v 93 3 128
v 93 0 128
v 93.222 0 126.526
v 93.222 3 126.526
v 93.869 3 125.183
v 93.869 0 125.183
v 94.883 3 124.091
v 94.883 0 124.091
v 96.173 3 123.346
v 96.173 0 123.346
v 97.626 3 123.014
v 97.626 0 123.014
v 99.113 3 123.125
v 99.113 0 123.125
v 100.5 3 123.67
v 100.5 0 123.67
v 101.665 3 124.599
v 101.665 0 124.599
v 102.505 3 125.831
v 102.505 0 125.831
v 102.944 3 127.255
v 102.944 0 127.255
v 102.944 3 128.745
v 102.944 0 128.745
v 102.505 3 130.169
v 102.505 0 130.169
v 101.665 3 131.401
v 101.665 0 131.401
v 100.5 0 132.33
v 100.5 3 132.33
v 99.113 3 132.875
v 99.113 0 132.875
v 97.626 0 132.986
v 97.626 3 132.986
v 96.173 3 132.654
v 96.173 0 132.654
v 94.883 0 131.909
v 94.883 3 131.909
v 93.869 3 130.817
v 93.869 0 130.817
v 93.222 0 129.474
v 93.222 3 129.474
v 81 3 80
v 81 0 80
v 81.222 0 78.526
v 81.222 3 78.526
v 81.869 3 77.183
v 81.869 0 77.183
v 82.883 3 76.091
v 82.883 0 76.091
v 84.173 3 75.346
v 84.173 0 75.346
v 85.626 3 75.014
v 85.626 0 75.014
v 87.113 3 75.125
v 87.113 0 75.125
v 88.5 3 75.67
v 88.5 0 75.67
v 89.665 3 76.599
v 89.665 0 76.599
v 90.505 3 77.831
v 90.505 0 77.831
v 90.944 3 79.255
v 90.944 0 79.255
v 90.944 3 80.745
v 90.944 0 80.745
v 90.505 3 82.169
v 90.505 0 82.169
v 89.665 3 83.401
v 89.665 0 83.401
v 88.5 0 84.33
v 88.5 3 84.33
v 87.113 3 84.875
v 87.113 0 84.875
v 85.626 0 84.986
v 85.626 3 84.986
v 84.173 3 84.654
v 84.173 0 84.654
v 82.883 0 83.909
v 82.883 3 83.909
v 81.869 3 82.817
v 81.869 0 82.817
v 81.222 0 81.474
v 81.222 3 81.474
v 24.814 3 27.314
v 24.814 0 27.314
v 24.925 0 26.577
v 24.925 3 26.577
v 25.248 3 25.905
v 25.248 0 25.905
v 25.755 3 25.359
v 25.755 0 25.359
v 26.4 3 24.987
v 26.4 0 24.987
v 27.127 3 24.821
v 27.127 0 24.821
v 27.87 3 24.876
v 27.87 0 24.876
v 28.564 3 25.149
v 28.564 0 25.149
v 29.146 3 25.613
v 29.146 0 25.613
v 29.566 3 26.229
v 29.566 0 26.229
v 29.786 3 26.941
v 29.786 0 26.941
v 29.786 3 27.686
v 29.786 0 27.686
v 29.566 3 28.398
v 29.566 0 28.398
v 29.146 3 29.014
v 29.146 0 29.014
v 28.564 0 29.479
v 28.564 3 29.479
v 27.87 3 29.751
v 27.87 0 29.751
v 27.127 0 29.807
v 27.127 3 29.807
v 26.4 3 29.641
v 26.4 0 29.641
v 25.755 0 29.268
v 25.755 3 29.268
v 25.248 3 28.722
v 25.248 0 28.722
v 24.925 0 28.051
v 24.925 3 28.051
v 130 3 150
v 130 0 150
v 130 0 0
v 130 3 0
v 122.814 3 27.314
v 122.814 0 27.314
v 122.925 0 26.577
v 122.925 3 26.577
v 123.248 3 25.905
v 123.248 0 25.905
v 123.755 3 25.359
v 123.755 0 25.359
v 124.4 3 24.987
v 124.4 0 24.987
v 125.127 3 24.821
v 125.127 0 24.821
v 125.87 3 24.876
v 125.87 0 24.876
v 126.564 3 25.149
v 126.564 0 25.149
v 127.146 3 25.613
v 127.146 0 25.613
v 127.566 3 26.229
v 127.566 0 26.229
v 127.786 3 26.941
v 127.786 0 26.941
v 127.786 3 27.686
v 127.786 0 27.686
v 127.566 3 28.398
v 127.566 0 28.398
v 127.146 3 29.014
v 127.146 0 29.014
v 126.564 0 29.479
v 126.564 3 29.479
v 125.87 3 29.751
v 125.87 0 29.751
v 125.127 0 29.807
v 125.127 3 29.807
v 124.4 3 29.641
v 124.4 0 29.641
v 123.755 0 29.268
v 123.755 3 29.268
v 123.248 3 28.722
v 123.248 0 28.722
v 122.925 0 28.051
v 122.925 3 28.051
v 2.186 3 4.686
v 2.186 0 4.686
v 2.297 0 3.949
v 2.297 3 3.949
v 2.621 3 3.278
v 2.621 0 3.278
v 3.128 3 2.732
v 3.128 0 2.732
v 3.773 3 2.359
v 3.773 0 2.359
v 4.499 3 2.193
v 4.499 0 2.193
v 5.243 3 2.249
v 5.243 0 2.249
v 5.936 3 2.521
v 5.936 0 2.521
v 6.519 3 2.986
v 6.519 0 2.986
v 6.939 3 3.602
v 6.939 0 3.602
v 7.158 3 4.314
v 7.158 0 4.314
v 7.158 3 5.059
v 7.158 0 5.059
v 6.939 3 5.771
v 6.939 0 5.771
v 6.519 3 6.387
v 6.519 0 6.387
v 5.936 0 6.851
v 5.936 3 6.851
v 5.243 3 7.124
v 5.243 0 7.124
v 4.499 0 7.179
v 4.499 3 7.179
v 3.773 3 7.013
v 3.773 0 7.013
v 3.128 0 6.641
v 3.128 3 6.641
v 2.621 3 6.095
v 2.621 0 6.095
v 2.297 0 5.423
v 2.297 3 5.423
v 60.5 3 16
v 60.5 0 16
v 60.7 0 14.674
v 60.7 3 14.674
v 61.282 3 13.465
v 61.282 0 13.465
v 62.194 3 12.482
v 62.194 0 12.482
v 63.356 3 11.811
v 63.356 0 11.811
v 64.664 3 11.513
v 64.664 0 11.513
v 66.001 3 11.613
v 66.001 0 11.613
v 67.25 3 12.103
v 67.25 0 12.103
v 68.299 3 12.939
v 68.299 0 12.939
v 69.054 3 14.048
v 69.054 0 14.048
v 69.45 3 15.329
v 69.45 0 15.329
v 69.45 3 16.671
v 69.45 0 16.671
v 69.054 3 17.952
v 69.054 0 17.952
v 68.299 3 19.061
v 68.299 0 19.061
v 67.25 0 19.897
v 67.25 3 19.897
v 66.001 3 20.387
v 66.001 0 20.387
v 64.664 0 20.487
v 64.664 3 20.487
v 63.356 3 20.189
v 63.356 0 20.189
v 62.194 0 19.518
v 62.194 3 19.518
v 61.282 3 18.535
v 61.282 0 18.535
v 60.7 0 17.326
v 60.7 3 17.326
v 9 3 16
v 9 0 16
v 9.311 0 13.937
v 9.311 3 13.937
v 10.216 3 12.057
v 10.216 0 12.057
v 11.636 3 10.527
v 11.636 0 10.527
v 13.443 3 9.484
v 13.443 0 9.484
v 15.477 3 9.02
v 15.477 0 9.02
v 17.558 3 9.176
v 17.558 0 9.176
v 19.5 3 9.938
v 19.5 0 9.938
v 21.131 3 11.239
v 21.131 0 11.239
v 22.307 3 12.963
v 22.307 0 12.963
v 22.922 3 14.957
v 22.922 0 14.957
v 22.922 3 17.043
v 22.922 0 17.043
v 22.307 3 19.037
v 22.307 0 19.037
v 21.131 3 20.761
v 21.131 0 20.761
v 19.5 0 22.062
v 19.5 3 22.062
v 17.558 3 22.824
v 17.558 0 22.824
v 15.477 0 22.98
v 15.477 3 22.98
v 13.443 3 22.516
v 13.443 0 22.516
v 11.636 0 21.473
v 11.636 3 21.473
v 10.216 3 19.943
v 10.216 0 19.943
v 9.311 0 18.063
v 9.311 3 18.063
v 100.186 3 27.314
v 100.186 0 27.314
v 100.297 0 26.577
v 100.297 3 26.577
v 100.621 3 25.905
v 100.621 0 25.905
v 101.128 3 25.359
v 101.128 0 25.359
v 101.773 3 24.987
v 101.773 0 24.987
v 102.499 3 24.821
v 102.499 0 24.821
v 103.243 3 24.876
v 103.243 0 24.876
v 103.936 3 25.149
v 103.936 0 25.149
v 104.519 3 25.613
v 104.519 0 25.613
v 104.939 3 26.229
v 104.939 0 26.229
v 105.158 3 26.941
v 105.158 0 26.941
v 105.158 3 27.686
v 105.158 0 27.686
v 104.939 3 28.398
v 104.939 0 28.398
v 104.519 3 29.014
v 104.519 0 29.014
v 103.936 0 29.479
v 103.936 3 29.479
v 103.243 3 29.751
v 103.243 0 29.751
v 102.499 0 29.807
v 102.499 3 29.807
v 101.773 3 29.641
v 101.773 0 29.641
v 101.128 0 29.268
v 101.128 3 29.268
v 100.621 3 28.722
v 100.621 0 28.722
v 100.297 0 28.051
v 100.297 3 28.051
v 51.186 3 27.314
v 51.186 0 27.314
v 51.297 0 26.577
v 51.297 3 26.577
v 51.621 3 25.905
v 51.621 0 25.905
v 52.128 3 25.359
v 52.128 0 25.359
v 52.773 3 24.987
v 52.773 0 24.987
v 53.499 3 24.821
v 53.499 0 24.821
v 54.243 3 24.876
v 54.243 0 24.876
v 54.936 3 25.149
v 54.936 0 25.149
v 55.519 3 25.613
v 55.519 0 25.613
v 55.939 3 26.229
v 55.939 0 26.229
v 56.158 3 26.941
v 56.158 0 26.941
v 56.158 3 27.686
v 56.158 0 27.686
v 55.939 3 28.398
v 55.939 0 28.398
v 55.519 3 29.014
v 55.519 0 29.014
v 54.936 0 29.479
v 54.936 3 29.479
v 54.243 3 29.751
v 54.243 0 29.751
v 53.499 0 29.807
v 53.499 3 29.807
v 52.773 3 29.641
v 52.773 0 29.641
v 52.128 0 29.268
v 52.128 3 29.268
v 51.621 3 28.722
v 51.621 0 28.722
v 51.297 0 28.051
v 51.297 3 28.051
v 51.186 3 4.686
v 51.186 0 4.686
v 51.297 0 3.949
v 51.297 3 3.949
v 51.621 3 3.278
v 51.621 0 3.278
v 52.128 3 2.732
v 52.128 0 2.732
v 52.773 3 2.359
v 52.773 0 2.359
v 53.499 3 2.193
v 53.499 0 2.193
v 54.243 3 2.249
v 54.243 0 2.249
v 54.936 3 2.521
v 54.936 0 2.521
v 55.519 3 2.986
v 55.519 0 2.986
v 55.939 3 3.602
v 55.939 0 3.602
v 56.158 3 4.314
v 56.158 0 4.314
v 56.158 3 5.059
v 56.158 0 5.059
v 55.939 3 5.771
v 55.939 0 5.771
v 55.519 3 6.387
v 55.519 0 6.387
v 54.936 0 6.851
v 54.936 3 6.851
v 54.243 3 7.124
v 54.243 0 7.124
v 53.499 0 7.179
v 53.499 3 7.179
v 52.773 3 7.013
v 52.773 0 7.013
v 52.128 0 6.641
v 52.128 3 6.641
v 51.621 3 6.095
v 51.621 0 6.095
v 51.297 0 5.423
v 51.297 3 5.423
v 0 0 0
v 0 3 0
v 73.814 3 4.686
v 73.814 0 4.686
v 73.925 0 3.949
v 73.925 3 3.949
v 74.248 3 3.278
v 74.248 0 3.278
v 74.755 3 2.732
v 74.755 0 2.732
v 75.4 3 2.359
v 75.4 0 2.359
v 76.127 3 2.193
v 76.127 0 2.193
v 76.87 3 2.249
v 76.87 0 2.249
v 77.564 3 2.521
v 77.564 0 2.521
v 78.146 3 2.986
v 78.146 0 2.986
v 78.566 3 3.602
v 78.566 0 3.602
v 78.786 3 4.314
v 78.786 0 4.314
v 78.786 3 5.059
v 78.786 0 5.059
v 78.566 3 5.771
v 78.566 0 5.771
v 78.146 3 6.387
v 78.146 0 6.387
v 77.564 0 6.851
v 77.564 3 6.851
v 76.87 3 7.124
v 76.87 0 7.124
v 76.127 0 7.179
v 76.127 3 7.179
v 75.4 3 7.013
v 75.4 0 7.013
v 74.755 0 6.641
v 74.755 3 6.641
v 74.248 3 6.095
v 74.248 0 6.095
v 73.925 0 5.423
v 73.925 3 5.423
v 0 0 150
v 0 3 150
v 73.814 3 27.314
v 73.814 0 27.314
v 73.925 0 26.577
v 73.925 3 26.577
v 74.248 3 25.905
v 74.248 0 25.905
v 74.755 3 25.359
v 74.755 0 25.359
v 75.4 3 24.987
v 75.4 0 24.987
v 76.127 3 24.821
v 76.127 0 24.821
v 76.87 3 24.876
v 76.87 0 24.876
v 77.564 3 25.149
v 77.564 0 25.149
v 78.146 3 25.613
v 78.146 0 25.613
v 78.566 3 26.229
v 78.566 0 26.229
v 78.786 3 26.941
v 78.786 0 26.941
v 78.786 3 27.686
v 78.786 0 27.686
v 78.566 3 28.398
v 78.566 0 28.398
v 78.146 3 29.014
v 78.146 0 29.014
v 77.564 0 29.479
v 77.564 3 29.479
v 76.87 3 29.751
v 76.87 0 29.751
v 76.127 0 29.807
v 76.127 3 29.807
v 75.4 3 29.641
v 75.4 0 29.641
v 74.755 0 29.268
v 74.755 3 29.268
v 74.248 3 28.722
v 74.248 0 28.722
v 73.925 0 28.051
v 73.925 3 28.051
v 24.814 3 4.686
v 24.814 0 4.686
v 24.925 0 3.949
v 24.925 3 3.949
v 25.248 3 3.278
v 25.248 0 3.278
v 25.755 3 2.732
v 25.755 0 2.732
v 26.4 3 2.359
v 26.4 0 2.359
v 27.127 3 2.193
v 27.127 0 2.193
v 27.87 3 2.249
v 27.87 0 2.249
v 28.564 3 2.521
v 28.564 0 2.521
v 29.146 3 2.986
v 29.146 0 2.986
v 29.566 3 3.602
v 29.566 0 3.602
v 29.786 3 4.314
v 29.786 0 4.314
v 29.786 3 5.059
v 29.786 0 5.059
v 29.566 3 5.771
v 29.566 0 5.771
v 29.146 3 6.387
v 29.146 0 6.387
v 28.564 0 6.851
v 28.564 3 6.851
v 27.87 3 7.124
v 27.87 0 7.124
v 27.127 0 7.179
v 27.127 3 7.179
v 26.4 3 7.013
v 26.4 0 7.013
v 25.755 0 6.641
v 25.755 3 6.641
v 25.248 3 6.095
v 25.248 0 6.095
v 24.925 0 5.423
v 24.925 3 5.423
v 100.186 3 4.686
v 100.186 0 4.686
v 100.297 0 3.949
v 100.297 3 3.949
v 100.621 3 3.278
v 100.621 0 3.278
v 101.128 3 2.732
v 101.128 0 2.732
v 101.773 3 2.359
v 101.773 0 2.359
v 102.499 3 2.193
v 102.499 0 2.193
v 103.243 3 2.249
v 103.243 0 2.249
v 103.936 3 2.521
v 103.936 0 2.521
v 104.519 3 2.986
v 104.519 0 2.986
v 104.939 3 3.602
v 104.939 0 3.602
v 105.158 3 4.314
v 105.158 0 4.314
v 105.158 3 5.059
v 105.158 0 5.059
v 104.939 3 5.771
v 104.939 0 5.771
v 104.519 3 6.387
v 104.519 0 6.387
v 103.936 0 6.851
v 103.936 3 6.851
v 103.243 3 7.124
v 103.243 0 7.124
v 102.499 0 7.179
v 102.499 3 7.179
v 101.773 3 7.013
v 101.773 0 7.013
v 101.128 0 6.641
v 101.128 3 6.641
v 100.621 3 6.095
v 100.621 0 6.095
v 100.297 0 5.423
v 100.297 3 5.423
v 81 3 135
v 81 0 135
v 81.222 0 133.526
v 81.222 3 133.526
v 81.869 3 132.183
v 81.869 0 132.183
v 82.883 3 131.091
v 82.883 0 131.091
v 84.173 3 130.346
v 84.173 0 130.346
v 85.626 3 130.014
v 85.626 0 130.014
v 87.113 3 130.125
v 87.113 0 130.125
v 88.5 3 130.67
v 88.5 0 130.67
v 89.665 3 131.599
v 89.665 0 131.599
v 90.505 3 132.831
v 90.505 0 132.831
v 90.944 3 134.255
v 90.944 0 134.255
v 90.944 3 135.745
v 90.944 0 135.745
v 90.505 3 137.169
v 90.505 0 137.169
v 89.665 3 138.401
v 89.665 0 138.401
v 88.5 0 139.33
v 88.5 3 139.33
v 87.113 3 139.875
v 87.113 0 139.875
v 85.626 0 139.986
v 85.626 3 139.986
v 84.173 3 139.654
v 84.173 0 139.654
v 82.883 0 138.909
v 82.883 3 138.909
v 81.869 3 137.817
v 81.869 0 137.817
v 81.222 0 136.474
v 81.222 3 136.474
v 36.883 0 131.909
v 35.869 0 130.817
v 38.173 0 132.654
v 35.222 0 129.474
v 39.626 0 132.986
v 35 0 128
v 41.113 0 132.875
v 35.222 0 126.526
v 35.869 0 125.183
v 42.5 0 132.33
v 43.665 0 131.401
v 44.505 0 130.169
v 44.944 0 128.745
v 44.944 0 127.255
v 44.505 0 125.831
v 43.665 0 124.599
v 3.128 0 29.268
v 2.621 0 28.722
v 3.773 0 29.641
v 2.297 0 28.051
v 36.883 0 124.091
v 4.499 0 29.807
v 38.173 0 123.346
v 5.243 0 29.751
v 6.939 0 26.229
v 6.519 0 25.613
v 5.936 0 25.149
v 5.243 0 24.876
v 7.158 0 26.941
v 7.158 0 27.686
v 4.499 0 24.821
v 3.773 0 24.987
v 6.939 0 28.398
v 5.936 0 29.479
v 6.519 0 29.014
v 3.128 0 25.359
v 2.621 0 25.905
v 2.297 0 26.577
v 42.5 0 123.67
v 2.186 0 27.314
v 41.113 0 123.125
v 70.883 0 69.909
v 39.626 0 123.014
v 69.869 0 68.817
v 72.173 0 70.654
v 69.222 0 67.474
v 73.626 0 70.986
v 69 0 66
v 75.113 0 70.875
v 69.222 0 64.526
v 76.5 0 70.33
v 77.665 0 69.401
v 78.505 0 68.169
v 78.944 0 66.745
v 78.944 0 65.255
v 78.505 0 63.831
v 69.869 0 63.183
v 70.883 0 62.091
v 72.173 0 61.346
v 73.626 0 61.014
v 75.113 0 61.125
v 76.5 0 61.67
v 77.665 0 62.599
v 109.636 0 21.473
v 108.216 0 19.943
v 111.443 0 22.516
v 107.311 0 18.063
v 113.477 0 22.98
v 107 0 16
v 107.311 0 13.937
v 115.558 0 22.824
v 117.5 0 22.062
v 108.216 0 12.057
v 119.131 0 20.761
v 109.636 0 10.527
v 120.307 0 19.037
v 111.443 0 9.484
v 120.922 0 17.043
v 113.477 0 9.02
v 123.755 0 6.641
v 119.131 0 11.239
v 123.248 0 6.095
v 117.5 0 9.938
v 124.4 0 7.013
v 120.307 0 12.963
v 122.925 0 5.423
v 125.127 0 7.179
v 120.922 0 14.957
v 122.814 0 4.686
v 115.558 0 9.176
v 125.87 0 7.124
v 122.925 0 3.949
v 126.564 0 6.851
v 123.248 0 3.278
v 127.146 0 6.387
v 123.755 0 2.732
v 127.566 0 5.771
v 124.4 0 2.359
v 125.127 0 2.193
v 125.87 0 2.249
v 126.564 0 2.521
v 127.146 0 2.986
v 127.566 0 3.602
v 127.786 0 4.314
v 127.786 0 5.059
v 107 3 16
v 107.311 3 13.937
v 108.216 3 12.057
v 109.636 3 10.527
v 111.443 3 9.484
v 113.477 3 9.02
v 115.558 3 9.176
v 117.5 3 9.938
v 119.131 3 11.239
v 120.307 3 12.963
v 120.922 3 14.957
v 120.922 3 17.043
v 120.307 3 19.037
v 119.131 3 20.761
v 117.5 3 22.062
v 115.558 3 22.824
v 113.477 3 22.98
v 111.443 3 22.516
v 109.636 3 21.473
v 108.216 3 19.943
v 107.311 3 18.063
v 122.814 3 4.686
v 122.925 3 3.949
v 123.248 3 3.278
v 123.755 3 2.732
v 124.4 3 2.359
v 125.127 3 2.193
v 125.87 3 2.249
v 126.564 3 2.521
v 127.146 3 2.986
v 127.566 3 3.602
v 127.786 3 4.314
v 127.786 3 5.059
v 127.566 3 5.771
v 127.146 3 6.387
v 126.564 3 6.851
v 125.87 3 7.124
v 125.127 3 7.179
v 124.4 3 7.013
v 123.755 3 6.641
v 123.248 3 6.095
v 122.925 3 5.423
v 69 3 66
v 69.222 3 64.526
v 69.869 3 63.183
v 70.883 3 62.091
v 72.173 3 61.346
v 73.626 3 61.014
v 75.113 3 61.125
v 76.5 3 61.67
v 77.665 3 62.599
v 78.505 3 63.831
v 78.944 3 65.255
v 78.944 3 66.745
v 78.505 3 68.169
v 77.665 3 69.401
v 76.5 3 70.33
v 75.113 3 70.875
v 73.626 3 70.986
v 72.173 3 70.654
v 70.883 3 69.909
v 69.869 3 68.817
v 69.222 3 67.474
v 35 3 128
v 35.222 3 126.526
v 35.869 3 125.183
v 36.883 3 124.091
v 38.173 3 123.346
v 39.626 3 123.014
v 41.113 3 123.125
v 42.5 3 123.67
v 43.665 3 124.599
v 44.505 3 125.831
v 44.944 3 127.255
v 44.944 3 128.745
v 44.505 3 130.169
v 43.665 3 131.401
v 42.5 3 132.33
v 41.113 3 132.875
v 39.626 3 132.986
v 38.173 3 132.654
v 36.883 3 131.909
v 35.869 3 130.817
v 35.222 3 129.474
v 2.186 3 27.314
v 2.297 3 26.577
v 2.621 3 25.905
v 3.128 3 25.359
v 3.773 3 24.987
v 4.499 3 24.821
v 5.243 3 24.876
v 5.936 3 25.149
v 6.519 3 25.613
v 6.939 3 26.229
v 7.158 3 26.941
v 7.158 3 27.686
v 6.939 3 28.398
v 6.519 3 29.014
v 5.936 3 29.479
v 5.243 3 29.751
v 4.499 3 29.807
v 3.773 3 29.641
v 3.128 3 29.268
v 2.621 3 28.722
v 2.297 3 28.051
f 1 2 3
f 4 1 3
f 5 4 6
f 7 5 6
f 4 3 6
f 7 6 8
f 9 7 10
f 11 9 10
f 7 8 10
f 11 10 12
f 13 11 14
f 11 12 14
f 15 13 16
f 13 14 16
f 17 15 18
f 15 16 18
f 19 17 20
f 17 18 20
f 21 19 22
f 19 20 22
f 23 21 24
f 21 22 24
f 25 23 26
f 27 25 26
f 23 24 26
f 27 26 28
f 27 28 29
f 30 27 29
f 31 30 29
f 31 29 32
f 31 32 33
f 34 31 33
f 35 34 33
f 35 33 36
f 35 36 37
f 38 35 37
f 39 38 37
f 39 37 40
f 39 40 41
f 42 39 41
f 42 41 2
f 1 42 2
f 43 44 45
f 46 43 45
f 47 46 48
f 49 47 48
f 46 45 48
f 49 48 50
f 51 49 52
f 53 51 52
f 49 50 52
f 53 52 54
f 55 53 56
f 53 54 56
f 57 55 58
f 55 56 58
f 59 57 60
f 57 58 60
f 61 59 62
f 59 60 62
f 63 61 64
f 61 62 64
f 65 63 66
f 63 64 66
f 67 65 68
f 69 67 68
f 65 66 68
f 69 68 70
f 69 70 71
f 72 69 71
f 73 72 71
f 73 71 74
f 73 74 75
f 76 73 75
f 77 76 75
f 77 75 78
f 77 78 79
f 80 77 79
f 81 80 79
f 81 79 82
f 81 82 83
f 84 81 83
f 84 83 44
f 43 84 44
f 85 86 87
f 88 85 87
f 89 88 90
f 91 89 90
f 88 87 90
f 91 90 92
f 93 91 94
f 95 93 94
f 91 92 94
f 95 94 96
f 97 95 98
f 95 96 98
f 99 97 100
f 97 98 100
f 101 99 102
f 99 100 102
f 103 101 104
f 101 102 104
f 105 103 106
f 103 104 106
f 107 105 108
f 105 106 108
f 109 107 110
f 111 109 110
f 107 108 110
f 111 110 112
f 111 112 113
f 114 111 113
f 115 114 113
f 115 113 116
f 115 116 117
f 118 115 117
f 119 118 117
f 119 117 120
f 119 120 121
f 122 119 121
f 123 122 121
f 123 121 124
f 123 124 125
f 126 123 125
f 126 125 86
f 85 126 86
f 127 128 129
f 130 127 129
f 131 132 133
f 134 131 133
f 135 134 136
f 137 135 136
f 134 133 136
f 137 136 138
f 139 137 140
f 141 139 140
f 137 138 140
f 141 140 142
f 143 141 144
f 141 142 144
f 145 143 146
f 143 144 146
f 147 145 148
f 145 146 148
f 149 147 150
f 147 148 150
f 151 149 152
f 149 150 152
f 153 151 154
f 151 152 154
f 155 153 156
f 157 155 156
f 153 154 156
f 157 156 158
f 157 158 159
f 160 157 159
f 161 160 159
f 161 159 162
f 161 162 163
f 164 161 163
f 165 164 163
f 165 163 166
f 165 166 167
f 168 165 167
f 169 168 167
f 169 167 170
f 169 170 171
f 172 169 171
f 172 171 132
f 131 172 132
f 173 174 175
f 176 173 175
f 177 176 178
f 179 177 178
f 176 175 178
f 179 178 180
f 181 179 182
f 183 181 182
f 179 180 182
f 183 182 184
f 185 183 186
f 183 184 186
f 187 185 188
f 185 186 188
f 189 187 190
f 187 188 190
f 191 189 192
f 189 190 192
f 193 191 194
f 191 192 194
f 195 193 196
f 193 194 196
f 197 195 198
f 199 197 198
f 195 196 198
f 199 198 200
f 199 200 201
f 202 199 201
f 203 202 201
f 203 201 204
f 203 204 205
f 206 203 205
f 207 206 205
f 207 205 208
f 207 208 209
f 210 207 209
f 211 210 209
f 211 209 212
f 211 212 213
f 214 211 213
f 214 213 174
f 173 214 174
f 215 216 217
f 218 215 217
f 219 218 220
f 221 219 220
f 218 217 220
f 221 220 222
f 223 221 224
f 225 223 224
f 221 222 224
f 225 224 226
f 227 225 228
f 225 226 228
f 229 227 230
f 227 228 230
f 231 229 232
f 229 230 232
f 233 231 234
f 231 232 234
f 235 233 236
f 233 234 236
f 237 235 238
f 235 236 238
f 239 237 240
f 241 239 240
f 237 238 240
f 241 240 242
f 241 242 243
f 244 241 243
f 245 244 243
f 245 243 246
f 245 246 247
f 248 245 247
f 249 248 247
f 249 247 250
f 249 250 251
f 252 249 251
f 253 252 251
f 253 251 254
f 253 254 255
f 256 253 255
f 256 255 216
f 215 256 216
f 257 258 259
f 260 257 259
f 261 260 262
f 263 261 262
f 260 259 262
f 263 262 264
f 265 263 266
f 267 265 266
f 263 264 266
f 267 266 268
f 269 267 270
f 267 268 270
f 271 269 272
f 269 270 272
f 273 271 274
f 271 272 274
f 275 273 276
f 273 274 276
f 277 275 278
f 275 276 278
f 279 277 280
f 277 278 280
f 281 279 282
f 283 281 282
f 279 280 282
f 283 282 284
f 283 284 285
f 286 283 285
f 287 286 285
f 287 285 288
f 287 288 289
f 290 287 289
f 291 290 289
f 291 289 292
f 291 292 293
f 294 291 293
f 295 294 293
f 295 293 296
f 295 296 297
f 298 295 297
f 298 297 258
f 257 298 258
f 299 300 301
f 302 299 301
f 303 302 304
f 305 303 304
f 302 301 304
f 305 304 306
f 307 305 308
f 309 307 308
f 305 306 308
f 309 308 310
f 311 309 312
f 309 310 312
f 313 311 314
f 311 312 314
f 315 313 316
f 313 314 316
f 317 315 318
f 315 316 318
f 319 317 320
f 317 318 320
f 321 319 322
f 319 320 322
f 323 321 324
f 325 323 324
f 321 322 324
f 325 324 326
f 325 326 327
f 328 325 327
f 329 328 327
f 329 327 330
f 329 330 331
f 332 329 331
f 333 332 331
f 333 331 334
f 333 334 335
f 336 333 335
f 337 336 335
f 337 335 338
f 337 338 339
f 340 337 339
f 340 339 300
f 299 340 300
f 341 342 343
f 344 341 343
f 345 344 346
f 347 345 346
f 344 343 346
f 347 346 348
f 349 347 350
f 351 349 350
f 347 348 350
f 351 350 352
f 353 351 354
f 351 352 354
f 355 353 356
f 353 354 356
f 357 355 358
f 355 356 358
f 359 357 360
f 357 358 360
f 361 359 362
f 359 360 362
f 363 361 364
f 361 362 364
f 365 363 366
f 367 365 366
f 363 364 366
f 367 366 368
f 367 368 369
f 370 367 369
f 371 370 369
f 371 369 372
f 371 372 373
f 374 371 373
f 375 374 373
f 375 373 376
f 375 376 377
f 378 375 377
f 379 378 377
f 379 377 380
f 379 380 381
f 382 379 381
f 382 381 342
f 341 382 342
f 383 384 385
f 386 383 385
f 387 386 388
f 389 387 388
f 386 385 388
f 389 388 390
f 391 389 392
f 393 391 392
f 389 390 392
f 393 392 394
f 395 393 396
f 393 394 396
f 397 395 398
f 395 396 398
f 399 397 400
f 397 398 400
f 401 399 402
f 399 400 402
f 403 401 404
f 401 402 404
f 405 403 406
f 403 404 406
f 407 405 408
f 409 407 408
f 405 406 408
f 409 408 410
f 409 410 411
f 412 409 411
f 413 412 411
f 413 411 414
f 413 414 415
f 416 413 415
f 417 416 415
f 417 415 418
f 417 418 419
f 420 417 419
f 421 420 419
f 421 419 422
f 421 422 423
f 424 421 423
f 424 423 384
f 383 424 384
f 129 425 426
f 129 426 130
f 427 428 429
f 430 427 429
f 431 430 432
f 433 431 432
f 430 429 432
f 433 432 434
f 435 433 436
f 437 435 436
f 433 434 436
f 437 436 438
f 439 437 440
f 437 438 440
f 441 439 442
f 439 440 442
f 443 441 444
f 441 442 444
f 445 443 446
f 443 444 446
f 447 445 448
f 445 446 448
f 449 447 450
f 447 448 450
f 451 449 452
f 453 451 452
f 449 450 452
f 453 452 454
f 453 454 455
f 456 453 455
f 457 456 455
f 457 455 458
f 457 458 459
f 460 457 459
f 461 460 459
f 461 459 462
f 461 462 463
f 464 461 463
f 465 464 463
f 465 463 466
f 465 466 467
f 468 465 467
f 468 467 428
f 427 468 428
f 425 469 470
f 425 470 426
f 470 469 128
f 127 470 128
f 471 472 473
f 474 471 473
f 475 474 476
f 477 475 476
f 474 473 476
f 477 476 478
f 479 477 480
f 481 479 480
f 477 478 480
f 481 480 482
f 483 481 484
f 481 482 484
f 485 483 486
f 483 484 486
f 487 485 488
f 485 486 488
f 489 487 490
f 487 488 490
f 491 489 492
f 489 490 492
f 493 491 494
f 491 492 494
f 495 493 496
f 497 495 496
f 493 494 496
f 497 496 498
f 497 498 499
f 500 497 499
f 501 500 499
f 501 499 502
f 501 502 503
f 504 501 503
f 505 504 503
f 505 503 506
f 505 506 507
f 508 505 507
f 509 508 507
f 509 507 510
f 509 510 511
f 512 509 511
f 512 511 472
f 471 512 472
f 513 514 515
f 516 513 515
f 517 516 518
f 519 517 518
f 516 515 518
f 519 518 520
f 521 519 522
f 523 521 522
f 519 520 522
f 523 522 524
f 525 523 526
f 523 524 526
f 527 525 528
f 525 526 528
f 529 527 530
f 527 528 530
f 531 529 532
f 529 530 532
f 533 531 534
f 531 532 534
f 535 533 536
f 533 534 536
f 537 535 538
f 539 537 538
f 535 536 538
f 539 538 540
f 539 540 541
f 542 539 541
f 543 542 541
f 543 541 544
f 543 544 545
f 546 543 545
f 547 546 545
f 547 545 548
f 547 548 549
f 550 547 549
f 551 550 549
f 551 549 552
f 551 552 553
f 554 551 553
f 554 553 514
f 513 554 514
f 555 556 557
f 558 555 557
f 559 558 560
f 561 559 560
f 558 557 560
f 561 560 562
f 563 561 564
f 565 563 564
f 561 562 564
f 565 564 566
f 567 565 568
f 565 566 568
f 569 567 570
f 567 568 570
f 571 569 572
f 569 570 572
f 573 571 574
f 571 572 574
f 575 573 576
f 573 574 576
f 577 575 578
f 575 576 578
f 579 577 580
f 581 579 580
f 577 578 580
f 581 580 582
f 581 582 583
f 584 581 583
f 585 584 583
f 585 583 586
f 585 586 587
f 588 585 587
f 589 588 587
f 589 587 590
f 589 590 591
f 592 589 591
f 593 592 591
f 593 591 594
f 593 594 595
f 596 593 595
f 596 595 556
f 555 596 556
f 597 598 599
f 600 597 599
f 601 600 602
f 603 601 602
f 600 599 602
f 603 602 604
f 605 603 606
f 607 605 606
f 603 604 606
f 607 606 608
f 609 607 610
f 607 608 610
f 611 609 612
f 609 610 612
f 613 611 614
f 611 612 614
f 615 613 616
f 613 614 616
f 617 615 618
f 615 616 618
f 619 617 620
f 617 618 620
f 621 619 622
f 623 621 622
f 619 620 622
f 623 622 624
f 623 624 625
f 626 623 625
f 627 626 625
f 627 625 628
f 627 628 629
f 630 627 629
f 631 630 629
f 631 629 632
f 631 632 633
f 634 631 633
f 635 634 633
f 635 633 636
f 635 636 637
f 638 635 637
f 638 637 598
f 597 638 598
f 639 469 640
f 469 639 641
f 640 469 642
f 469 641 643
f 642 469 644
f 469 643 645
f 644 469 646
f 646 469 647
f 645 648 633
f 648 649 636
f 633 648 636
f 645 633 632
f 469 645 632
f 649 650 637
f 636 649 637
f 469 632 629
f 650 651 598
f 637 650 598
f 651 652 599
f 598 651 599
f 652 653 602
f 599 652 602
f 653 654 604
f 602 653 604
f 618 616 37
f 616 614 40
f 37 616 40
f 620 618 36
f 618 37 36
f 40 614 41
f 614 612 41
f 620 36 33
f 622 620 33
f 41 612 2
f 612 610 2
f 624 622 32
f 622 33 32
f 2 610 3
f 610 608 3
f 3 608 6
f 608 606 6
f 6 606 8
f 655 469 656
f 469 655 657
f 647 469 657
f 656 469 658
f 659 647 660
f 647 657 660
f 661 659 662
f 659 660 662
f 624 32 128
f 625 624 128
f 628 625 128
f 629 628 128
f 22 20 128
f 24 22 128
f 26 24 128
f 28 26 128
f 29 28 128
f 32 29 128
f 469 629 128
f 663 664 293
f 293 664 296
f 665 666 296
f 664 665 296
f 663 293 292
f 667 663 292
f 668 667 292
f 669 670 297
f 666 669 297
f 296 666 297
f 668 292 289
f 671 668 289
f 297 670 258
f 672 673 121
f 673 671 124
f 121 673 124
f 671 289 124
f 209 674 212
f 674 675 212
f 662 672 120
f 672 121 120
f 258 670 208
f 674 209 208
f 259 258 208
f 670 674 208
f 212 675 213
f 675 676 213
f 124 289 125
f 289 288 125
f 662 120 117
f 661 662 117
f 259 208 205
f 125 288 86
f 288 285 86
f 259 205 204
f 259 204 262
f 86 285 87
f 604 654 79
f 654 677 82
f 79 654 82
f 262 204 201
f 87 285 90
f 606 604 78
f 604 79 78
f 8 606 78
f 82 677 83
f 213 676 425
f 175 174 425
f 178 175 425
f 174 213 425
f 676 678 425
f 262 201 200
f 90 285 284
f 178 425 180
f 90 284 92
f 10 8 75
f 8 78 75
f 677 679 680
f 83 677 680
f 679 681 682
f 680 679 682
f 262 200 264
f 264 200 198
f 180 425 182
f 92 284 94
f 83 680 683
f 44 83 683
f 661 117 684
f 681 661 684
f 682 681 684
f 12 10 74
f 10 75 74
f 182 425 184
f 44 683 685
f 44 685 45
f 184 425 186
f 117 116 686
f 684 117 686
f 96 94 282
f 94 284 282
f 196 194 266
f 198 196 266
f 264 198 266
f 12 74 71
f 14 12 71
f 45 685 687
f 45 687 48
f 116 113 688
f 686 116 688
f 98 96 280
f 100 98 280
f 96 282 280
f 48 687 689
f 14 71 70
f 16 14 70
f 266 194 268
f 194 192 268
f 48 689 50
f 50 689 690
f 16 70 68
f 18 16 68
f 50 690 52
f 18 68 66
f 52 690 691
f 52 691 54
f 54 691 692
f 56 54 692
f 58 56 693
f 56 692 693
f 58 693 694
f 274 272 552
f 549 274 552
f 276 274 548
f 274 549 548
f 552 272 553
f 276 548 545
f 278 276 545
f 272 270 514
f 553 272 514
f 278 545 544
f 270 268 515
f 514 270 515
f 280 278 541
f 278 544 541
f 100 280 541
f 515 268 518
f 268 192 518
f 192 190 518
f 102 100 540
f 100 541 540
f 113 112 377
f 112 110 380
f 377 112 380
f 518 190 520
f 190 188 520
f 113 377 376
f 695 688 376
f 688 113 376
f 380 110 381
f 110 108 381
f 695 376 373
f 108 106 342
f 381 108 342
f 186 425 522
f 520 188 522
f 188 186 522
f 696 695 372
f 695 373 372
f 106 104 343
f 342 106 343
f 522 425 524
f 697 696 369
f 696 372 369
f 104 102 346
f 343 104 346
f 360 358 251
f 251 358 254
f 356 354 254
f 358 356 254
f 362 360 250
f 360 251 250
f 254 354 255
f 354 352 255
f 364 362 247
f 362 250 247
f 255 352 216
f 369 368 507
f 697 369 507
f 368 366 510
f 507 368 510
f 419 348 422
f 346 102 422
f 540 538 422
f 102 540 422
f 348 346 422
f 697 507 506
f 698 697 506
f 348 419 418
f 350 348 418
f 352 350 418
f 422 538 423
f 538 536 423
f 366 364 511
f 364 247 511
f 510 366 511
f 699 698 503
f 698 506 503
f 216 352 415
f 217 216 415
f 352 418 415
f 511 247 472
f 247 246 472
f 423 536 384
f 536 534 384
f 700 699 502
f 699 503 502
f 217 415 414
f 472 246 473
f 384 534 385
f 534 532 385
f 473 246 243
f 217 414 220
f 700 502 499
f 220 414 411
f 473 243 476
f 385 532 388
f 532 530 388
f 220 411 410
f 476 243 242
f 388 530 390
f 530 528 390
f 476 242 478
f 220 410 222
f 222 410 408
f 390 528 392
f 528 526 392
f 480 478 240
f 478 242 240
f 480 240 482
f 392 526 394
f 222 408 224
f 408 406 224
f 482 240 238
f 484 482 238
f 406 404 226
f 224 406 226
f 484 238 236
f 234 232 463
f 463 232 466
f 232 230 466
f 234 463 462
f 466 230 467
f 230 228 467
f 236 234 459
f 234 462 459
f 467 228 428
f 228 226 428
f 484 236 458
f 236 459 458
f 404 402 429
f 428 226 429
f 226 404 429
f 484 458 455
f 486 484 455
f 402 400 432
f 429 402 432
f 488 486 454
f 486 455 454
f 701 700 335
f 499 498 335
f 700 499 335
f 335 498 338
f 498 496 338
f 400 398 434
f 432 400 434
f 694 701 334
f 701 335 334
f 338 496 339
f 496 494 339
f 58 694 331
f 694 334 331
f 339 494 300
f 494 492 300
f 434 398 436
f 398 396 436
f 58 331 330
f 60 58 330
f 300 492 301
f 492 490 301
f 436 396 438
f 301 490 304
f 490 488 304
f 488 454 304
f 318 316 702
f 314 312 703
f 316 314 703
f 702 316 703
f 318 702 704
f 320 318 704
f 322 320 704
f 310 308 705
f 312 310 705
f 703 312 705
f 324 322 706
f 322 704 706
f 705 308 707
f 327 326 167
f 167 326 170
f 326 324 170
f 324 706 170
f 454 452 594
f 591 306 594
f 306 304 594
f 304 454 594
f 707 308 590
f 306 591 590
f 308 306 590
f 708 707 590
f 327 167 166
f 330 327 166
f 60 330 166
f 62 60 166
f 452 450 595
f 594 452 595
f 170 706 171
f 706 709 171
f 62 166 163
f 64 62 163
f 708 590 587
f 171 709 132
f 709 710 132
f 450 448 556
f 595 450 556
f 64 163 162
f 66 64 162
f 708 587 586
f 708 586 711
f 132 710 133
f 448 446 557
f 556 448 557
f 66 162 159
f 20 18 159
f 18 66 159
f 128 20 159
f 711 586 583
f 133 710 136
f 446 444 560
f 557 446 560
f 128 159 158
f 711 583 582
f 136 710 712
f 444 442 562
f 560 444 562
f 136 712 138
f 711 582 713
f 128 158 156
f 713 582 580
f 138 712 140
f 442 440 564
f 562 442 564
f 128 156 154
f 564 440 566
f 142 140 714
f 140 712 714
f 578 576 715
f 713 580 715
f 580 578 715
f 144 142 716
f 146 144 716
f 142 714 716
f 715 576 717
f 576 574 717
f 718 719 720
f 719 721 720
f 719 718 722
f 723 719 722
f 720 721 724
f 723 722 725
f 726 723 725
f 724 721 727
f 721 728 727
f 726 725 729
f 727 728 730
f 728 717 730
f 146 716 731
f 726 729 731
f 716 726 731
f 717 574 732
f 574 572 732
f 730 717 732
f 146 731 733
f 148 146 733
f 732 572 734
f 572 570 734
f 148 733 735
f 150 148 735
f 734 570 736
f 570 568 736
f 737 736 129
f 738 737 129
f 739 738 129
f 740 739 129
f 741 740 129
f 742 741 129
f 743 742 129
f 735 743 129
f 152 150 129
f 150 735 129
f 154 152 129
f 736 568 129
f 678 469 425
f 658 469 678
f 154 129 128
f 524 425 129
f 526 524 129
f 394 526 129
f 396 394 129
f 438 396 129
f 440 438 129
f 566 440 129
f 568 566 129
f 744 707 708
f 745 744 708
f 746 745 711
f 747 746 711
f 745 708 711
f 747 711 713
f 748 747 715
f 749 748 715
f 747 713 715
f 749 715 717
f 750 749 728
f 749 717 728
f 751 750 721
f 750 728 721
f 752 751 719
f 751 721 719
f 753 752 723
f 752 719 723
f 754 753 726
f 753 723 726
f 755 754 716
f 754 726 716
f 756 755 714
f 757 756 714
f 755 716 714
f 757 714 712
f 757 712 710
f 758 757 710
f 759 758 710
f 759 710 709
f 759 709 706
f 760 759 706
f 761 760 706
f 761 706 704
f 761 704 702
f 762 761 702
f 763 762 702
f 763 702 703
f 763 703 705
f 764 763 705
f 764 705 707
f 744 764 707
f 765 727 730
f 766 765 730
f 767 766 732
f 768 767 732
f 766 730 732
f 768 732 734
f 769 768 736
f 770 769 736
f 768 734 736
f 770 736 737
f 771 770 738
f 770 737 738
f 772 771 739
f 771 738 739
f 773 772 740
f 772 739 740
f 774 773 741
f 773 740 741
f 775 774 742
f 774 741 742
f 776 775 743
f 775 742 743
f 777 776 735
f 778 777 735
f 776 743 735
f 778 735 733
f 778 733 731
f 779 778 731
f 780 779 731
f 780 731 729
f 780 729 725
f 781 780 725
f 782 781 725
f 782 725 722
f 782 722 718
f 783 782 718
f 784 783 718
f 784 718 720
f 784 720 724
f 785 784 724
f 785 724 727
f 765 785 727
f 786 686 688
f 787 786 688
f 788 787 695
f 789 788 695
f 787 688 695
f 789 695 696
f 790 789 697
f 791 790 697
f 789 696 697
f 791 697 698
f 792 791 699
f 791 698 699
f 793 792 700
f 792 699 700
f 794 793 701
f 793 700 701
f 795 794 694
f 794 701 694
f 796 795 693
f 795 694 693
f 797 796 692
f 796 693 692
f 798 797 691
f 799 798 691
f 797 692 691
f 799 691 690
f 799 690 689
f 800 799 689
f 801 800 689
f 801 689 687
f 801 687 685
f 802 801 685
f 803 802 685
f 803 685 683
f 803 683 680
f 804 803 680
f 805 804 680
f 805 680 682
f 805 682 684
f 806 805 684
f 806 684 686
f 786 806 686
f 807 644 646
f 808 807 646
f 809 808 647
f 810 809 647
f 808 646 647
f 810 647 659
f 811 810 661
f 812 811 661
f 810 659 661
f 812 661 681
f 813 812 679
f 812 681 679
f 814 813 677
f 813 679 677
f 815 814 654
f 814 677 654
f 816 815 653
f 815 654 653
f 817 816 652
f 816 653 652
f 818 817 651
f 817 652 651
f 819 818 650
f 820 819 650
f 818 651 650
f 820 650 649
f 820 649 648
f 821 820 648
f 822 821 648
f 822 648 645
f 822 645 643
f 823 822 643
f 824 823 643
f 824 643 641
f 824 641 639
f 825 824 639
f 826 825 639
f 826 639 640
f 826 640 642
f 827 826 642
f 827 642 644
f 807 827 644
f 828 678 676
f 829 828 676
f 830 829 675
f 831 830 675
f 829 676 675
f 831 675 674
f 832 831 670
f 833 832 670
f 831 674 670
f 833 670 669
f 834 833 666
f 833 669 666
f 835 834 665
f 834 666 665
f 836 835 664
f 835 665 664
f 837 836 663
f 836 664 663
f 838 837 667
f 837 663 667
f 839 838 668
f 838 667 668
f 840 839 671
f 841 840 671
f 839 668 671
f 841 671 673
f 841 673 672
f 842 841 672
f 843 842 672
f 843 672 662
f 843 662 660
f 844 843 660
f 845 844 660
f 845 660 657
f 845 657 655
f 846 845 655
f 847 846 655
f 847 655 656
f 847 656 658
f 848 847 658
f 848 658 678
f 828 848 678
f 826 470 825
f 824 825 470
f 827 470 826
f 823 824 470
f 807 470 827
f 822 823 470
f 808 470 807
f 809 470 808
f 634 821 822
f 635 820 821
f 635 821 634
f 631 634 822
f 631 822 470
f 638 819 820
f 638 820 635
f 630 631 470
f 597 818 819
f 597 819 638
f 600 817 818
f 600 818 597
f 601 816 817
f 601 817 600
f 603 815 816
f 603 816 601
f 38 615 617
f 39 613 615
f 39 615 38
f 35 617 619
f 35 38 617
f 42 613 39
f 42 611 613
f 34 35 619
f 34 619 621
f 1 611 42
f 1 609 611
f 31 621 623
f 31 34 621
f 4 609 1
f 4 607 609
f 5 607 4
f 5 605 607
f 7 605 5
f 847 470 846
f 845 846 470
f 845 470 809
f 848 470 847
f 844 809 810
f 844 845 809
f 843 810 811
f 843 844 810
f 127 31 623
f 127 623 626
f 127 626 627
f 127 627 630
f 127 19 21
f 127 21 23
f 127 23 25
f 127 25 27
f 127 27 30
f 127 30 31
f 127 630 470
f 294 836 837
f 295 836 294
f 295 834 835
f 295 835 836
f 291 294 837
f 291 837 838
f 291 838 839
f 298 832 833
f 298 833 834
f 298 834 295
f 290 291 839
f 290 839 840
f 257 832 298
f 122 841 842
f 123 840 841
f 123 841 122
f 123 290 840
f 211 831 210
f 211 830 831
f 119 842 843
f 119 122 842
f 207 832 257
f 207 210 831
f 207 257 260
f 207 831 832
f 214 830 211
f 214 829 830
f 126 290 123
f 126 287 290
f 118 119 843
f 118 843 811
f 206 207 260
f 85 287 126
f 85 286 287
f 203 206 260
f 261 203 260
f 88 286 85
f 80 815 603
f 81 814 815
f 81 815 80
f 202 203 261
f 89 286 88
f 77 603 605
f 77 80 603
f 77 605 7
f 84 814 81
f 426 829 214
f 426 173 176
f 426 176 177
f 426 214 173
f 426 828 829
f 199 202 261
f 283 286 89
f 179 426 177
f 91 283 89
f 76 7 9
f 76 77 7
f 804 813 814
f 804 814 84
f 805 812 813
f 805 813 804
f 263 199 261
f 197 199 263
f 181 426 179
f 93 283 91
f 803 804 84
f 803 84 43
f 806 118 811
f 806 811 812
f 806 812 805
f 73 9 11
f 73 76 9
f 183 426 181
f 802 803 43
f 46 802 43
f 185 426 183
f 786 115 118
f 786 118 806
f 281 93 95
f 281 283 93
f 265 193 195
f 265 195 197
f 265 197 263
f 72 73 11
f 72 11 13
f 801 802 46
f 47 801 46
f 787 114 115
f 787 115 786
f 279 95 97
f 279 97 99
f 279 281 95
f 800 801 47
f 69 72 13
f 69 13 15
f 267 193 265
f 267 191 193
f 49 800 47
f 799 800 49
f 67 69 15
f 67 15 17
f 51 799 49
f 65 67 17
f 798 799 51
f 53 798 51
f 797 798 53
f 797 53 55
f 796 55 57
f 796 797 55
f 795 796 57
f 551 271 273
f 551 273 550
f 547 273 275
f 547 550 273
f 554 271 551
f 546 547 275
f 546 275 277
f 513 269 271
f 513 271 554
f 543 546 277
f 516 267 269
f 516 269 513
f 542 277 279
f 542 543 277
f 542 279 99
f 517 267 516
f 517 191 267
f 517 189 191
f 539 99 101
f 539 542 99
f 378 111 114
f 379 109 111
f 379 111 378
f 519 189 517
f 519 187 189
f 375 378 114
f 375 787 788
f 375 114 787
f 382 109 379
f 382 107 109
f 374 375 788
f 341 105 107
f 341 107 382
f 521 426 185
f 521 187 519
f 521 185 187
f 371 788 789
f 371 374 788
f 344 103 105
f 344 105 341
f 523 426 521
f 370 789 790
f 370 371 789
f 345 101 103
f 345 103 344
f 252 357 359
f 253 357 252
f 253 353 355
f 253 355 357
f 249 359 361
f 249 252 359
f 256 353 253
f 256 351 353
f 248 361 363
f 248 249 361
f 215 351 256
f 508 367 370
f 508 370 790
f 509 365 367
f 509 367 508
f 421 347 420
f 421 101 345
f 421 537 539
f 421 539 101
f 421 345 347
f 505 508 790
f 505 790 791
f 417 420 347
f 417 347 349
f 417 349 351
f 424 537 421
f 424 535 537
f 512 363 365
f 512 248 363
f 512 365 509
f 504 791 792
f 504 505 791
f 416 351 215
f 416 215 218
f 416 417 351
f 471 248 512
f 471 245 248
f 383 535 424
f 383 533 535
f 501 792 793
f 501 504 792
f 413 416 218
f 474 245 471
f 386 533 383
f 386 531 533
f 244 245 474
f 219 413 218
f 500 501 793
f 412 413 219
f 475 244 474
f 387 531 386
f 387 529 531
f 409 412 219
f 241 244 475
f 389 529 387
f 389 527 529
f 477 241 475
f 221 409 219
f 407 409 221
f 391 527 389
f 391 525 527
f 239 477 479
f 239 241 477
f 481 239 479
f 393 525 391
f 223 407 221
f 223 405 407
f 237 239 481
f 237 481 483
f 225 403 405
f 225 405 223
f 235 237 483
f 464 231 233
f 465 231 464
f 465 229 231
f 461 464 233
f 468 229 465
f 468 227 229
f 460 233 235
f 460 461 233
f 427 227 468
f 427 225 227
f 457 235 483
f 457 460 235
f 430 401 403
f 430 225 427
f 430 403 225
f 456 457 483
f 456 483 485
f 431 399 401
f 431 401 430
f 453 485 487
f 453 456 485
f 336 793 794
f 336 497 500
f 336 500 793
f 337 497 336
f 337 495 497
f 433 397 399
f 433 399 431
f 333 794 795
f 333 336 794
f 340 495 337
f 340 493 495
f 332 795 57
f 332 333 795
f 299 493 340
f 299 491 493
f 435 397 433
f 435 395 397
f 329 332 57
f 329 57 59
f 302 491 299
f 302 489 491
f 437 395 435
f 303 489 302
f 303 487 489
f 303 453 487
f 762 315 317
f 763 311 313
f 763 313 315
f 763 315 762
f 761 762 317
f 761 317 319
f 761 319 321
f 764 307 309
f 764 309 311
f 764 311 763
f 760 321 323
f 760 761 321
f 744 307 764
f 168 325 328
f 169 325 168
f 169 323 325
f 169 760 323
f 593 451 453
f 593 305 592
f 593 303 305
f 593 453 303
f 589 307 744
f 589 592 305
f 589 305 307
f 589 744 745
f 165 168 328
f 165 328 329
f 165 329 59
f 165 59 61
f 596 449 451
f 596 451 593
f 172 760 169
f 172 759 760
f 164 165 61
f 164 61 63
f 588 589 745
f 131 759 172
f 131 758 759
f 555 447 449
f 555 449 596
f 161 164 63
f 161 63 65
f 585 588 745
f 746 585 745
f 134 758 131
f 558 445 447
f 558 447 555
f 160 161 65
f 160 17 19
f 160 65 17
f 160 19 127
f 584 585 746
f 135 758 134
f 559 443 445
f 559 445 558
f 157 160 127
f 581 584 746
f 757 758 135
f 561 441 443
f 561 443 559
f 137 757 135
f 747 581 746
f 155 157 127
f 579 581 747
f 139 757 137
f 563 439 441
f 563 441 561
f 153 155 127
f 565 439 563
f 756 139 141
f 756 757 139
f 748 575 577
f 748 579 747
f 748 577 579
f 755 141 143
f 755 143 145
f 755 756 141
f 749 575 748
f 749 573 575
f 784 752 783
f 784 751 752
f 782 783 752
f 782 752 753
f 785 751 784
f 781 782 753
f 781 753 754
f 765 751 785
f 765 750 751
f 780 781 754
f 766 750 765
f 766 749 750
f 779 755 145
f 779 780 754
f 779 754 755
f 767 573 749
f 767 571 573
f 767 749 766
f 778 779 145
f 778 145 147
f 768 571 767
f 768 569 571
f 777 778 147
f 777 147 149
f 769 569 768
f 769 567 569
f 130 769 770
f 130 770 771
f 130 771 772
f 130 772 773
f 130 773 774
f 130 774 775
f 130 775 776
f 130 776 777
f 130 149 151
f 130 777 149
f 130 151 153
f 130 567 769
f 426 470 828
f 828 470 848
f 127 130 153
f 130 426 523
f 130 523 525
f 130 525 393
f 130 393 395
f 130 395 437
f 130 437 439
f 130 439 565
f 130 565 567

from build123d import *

# Parameters (mm, degrees)
SKETCH1_W                  = 130
SKETCH1_H                  = 150
BOSS_EXTRUDE1_DEPTH        = 3
F_10_0_10_DIAMETER_HOLE2_D = 10
F_14_0_14_DIAMETER_HOLE1_D = 14
F_5_0_5_DIAMETER_HOLE1_D   = 5
F_10_0_10_DIAMETER_HOLE1_D = 10
F_9_0_9_DIAMETER_HOLE1_D   = 9
F_5_0_5_DIAMETER_HOLE2_D   = 5


with BuildPart() as part:
    # Sketch1 → Boss-Extrude1 (new body)
    with BuildSketch(Plane(origin=(0, 0, 0), x_dir=(1, 0, 0), z_dir=(0, 1, 0))):
        with Locations((65, -75)):
            Rectangle(SKETCH1_W, SKETCH1_H)
    extrude(amount=BOSS_EXTRUDE1_DEPTH)

    # Ø10.0 (10) Diameter Hole2 (through all)
    with Locations(Plane(origin=(0, 3, 0), x_dir=(1, 0, 0), z_dir=(0, 1, 0))):
        with Locations((98, -128), (40, -128), (74, -66)):
            Hole(F_10_0_10_DIAMETER_HOLE2_D / 2)

    # Ø14.0 (14) Diameter Hole1 (through all)
    with Locations(Plane(origin=(0, 3, 0), x_dir=(1, 0, 0), z_dir=(0, 1, 0))):
        with Locations((16, -16), (114, -16)):
            Hole(F_14_0_14_DIAMETER_HOLE1_D / 2)

    # Ø5.0 (5) Diameter Hole1 (through all)
    with Locations(Plane(origin=(0, 3, 0), x_dir=(1, 0, 0), z_dir=(0, 1, 0))):
        with Locations((4.686291501, -27.313708499), (4.686291501, -4.686291501), (27.313708499, -4.686291501), (27.313708499, -27.313708499), (102.686291501, -27.313708499), (125.313708499, -27.313708499), (125.313708499, -4.686291501), (102.686291501, -4.686291501)):
            Hole(F_5_0_5_DIAMETER_HOLE1_D / 2)

    # Ø10.0 (10) Diameter Hole1 (through all)
    with Locations(Plane(origin=(0, 3, 0), x_dir=(1, 0, 0), z_dir=(0, 1, 0))):
        with Locations((86, -80), (86, -135)):
            Hole(F_10_0_10_DIAMETER_HOLE1_D / 2)

    # Ø9.0 (9) Diameter Hole1 (through all)
    with Locations(Plane(origin=(0, 3, 0), x_dir=(1, 0, 0), z_dir=(0, 1, 0))):
        with Locations((65, -16)):
            Hole(F_9_0_9_DIAMETER_HOLE1_D / 2)

    # Ø5.0 (5) Diameter Hole2 (through all)
    with Locations(Plane(origin=(0, 3, 0), x_dir=(1, 0, 0), z_dir=(0, 1, 0))):
        with Locations((53.686291501, -27.313708499), (76.313708499, -27.313708499), (76.313708499, -4.686291501), (53.686291501, -4.686291501)):
            Hole(F_5_0_5_DIAMETER_HOLE2_D / 2)


solid = part.part
